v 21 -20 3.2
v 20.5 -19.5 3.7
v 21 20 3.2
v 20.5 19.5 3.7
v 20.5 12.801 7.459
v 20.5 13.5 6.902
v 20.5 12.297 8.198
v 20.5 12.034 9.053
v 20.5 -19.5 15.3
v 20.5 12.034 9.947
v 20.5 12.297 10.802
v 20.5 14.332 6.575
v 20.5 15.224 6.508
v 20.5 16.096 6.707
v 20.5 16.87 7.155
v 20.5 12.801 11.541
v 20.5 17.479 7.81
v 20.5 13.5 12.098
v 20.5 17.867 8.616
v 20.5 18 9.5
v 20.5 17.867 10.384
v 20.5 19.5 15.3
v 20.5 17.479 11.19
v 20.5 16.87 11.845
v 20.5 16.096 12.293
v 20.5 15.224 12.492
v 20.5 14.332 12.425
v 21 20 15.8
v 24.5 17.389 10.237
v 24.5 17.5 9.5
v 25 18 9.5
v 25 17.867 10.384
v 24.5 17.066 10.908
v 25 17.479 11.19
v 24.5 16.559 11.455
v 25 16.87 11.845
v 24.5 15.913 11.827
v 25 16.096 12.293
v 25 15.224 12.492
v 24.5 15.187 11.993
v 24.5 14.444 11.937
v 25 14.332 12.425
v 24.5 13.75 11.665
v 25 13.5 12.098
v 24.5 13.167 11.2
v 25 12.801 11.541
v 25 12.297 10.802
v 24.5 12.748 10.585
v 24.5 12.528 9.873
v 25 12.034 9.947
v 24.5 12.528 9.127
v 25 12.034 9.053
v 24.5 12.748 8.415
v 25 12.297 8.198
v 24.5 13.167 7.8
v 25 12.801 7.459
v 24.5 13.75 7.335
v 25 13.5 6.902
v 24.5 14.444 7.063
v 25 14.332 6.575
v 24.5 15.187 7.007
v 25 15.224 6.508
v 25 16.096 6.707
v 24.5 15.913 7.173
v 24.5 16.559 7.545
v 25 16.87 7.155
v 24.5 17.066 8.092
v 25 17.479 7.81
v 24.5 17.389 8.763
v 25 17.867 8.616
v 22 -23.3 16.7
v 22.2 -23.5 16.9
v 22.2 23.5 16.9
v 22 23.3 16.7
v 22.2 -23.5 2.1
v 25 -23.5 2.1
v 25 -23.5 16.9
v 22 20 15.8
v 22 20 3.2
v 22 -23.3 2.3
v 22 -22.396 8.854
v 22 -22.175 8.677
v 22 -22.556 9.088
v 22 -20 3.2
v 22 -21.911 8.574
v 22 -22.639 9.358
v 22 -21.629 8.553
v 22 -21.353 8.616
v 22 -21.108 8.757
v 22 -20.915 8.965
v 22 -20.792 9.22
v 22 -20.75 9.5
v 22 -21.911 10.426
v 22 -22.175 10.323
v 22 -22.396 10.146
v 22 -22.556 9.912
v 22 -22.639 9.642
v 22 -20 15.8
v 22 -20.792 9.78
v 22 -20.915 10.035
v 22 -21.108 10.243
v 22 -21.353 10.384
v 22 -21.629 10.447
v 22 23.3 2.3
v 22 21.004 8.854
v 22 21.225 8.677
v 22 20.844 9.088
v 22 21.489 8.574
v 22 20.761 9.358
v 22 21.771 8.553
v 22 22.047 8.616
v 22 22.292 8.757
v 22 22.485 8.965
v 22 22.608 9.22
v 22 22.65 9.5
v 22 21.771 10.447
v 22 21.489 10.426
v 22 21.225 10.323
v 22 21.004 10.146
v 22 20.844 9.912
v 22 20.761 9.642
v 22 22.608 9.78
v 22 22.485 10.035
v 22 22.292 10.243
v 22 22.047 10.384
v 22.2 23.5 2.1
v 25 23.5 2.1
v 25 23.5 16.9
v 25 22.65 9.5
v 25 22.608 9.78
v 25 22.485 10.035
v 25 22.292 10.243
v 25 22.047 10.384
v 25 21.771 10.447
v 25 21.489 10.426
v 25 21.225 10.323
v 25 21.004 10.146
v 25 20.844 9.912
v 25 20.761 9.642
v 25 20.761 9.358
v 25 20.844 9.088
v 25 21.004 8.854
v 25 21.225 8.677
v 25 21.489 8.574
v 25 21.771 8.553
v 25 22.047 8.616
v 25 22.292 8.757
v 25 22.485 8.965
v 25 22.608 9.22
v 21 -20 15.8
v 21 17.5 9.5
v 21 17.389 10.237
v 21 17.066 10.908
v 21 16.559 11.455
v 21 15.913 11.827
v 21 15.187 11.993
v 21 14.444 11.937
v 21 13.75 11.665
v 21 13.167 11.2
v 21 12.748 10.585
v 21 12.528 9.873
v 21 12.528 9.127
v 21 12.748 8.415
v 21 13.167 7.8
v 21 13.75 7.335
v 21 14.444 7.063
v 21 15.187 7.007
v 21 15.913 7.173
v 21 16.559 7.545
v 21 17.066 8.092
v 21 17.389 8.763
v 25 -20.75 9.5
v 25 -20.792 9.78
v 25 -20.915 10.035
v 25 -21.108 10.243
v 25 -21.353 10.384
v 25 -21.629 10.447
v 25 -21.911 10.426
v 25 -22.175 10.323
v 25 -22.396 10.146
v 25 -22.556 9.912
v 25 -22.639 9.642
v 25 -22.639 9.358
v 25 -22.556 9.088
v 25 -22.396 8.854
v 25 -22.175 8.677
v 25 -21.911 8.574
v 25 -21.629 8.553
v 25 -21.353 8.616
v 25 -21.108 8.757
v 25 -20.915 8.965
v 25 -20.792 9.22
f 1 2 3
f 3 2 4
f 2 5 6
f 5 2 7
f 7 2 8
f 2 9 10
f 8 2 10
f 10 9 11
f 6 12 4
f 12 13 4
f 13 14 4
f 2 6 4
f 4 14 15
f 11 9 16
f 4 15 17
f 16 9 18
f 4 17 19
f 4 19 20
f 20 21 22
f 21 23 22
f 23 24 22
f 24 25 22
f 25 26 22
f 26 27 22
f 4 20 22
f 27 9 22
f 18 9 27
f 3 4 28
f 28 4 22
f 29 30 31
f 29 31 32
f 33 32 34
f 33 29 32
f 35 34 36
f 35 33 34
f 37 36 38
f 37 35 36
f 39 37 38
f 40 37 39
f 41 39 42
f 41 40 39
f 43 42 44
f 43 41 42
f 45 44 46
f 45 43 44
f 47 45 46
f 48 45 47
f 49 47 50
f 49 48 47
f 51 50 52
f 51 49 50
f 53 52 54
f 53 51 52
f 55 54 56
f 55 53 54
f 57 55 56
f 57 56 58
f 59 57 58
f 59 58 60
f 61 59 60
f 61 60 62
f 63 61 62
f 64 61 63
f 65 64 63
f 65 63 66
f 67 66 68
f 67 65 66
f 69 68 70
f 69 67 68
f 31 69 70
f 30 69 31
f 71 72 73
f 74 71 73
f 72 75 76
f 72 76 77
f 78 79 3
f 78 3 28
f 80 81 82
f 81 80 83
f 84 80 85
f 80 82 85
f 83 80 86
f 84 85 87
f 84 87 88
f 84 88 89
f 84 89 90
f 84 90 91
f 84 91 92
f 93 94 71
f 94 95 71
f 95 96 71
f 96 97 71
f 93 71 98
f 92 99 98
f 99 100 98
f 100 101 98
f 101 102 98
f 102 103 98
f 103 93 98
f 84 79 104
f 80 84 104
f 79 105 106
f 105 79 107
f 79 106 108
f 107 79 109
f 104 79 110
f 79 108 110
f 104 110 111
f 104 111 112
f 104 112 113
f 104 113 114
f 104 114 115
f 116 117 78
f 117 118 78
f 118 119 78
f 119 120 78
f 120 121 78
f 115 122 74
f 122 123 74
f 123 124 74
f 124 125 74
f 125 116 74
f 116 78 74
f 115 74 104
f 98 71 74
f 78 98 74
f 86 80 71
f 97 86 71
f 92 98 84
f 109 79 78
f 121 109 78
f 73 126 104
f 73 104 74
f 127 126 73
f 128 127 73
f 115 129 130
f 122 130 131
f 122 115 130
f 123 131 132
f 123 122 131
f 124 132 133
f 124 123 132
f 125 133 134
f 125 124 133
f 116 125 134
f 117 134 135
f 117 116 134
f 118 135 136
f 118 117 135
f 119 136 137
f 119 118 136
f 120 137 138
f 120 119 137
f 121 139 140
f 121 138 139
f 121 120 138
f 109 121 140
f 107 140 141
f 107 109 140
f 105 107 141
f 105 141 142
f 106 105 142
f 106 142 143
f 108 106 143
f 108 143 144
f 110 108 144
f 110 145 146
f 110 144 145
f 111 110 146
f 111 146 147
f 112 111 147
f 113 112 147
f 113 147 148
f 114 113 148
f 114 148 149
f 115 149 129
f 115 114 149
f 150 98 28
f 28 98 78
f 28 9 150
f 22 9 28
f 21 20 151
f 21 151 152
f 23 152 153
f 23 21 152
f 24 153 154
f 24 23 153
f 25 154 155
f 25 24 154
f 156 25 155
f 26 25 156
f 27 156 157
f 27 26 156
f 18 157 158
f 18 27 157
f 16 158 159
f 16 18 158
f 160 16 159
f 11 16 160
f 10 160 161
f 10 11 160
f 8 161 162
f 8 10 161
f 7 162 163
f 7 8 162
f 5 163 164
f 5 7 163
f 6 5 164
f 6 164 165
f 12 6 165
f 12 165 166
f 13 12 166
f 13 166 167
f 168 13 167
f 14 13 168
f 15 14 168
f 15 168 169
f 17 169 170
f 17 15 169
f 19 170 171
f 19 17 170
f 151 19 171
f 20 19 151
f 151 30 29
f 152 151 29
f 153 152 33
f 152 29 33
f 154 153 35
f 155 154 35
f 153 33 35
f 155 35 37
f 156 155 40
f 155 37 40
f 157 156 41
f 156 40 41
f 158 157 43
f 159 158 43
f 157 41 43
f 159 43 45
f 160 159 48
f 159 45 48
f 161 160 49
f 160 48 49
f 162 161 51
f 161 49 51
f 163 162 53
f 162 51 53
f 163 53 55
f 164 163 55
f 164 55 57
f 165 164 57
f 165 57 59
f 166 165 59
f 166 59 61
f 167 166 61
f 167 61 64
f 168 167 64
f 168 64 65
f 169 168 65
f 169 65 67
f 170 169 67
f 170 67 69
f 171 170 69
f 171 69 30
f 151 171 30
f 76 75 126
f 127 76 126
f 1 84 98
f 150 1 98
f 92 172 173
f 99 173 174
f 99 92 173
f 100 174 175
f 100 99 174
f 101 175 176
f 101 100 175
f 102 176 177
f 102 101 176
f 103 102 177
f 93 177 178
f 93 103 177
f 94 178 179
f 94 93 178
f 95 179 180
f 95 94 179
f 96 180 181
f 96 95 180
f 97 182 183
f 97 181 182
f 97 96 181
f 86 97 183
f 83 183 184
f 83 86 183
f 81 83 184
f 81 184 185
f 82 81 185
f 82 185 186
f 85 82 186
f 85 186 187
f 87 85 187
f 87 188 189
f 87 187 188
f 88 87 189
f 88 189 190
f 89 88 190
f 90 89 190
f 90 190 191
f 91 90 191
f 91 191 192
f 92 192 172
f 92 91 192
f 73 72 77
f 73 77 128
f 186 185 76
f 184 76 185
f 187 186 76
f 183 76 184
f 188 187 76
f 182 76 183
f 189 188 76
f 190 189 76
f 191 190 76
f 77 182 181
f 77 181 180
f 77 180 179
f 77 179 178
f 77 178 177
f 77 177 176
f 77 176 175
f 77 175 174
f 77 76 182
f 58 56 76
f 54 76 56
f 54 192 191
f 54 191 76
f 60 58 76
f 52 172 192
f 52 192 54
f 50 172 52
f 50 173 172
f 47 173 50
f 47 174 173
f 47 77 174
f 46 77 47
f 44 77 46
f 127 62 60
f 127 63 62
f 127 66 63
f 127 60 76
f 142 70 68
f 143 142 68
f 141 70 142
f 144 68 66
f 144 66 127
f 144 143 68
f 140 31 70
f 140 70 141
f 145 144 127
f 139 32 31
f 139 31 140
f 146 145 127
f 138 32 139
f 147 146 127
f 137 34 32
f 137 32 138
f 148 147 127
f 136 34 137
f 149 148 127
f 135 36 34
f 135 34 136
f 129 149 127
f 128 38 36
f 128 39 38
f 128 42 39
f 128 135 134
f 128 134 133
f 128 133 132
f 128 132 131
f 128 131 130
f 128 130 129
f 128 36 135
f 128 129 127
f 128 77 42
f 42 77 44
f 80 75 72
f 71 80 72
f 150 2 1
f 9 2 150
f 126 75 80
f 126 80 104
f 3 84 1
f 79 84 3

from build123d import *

# Parameters (mm, degrees)
SKETCH013_W     = 47
SKETCH013_H     = 14.8
PAD005_DEPTH    = 3
SKETCH014_R     = 0.95
POCKET003_DEPTH = 5
SKETCH015_R     = 0.95
POCKET004_DEPTH = 2
SKETCH016_W     = 40
SKETCH016_H     = 12.6
PAD006_DEPTH    = 1.5
SKETCH017_R     = 2.5
POCKET005_DEPTH = 10
CHAMFER014_SIZE = 0.5
CHAMFER015_SIZE = 0.5
CHAMFER016_SIZE = 0.2


with BuildPart() as part:
    # Sketch013 → Pad005 (new body)
    with BuildSketch(Plane.YZ):
        with Locations((0, 4.5)):
            Rectangle(SKETCH013_W, SKETCH013_H)
    extrude(amount=PAD005_DEPTH)

    # Sketch014 → Pocket003 (cut)
    with BuildSketch(Plane.YZ):
        with Locations((-21.7, 4.5)):
            Circle(SKETCH014_R)
        with Locations((21.7, 4.5)):
            Circle(SKETCH014_R)
    extrude(amount=POCKET003_DEPTH, mode=Mode.SUBTRACT)

    # Sketch015 → Pocket004 (cut)
    with BuildSketch(Plane.YZ.offset(3)):
        with Locations((-21.7, 4.5)):
            Circle(SKETCH015_R)
        with Locations((21.7, 4.5)):
            Circle(SKETCH015_R)
    extrude(amount=-POCKET004_DEPTH, mode=Mode.SUBTRACT)

    # Sketch016 → Pad006 (join)
    with BuildSketch(Plane.YZ):
        with Locations((0, 4.5)):
            Rectangle(SKETCH016_W, SKETCH016_H)
    extrude(amount=-PAD006_DEPTH)

    # Sketch017 → Pocket005 (cut)
    with BuildSketch(Plane(origin=(3, 15, 4.5), x_dir=(0, 1, 0), z_dir=(1, 0, 0))):
        Circle(SKETCH017_R)
    extrude(amount=-POCKET005_DEPTH, mode=Mode.SUBTRACT)

    # Chamfer014
    chamfer014_edges = [part.edges().sort_by_distance(p)[0] for p in [
        (-1.5, 12.5, 4.5),
        (3, 12.5, 4.5),
    ]]
    chamfer(chamfer014_edges, length=CHAMFER014_SIZE)

    # Chamfer015
    chamfer015_edges = [part.edges().sort_by_distance(p)[0] for p in [
        (-1.5, 20, 4.5),
        (-1.5, 0, -1.8),
        (-1.5, -20, 4.5),
        (-1.5, 0, 10.8),
    ]]
    chamfer(chamfer015_edges, length=CHAMFER015_SIZE)

    # Chamfer016
    chamfer016_edges = [part.edges().sort_by_distance(p)[0] for p in [
        (0, 23.5, 4.5),
        (0, 0, -2.9),
        (0, 0, 11.9),
        (0, -23.5, 4.5),
    ]]
    chamfer(chamfer016_edges, length=CHAMFER016_SIZE)


with BuildPart() as part_1:
    # Body003 placement: moved
    add(part.part.moved(Location((22, 0, 5))))


solid = part_1.part
